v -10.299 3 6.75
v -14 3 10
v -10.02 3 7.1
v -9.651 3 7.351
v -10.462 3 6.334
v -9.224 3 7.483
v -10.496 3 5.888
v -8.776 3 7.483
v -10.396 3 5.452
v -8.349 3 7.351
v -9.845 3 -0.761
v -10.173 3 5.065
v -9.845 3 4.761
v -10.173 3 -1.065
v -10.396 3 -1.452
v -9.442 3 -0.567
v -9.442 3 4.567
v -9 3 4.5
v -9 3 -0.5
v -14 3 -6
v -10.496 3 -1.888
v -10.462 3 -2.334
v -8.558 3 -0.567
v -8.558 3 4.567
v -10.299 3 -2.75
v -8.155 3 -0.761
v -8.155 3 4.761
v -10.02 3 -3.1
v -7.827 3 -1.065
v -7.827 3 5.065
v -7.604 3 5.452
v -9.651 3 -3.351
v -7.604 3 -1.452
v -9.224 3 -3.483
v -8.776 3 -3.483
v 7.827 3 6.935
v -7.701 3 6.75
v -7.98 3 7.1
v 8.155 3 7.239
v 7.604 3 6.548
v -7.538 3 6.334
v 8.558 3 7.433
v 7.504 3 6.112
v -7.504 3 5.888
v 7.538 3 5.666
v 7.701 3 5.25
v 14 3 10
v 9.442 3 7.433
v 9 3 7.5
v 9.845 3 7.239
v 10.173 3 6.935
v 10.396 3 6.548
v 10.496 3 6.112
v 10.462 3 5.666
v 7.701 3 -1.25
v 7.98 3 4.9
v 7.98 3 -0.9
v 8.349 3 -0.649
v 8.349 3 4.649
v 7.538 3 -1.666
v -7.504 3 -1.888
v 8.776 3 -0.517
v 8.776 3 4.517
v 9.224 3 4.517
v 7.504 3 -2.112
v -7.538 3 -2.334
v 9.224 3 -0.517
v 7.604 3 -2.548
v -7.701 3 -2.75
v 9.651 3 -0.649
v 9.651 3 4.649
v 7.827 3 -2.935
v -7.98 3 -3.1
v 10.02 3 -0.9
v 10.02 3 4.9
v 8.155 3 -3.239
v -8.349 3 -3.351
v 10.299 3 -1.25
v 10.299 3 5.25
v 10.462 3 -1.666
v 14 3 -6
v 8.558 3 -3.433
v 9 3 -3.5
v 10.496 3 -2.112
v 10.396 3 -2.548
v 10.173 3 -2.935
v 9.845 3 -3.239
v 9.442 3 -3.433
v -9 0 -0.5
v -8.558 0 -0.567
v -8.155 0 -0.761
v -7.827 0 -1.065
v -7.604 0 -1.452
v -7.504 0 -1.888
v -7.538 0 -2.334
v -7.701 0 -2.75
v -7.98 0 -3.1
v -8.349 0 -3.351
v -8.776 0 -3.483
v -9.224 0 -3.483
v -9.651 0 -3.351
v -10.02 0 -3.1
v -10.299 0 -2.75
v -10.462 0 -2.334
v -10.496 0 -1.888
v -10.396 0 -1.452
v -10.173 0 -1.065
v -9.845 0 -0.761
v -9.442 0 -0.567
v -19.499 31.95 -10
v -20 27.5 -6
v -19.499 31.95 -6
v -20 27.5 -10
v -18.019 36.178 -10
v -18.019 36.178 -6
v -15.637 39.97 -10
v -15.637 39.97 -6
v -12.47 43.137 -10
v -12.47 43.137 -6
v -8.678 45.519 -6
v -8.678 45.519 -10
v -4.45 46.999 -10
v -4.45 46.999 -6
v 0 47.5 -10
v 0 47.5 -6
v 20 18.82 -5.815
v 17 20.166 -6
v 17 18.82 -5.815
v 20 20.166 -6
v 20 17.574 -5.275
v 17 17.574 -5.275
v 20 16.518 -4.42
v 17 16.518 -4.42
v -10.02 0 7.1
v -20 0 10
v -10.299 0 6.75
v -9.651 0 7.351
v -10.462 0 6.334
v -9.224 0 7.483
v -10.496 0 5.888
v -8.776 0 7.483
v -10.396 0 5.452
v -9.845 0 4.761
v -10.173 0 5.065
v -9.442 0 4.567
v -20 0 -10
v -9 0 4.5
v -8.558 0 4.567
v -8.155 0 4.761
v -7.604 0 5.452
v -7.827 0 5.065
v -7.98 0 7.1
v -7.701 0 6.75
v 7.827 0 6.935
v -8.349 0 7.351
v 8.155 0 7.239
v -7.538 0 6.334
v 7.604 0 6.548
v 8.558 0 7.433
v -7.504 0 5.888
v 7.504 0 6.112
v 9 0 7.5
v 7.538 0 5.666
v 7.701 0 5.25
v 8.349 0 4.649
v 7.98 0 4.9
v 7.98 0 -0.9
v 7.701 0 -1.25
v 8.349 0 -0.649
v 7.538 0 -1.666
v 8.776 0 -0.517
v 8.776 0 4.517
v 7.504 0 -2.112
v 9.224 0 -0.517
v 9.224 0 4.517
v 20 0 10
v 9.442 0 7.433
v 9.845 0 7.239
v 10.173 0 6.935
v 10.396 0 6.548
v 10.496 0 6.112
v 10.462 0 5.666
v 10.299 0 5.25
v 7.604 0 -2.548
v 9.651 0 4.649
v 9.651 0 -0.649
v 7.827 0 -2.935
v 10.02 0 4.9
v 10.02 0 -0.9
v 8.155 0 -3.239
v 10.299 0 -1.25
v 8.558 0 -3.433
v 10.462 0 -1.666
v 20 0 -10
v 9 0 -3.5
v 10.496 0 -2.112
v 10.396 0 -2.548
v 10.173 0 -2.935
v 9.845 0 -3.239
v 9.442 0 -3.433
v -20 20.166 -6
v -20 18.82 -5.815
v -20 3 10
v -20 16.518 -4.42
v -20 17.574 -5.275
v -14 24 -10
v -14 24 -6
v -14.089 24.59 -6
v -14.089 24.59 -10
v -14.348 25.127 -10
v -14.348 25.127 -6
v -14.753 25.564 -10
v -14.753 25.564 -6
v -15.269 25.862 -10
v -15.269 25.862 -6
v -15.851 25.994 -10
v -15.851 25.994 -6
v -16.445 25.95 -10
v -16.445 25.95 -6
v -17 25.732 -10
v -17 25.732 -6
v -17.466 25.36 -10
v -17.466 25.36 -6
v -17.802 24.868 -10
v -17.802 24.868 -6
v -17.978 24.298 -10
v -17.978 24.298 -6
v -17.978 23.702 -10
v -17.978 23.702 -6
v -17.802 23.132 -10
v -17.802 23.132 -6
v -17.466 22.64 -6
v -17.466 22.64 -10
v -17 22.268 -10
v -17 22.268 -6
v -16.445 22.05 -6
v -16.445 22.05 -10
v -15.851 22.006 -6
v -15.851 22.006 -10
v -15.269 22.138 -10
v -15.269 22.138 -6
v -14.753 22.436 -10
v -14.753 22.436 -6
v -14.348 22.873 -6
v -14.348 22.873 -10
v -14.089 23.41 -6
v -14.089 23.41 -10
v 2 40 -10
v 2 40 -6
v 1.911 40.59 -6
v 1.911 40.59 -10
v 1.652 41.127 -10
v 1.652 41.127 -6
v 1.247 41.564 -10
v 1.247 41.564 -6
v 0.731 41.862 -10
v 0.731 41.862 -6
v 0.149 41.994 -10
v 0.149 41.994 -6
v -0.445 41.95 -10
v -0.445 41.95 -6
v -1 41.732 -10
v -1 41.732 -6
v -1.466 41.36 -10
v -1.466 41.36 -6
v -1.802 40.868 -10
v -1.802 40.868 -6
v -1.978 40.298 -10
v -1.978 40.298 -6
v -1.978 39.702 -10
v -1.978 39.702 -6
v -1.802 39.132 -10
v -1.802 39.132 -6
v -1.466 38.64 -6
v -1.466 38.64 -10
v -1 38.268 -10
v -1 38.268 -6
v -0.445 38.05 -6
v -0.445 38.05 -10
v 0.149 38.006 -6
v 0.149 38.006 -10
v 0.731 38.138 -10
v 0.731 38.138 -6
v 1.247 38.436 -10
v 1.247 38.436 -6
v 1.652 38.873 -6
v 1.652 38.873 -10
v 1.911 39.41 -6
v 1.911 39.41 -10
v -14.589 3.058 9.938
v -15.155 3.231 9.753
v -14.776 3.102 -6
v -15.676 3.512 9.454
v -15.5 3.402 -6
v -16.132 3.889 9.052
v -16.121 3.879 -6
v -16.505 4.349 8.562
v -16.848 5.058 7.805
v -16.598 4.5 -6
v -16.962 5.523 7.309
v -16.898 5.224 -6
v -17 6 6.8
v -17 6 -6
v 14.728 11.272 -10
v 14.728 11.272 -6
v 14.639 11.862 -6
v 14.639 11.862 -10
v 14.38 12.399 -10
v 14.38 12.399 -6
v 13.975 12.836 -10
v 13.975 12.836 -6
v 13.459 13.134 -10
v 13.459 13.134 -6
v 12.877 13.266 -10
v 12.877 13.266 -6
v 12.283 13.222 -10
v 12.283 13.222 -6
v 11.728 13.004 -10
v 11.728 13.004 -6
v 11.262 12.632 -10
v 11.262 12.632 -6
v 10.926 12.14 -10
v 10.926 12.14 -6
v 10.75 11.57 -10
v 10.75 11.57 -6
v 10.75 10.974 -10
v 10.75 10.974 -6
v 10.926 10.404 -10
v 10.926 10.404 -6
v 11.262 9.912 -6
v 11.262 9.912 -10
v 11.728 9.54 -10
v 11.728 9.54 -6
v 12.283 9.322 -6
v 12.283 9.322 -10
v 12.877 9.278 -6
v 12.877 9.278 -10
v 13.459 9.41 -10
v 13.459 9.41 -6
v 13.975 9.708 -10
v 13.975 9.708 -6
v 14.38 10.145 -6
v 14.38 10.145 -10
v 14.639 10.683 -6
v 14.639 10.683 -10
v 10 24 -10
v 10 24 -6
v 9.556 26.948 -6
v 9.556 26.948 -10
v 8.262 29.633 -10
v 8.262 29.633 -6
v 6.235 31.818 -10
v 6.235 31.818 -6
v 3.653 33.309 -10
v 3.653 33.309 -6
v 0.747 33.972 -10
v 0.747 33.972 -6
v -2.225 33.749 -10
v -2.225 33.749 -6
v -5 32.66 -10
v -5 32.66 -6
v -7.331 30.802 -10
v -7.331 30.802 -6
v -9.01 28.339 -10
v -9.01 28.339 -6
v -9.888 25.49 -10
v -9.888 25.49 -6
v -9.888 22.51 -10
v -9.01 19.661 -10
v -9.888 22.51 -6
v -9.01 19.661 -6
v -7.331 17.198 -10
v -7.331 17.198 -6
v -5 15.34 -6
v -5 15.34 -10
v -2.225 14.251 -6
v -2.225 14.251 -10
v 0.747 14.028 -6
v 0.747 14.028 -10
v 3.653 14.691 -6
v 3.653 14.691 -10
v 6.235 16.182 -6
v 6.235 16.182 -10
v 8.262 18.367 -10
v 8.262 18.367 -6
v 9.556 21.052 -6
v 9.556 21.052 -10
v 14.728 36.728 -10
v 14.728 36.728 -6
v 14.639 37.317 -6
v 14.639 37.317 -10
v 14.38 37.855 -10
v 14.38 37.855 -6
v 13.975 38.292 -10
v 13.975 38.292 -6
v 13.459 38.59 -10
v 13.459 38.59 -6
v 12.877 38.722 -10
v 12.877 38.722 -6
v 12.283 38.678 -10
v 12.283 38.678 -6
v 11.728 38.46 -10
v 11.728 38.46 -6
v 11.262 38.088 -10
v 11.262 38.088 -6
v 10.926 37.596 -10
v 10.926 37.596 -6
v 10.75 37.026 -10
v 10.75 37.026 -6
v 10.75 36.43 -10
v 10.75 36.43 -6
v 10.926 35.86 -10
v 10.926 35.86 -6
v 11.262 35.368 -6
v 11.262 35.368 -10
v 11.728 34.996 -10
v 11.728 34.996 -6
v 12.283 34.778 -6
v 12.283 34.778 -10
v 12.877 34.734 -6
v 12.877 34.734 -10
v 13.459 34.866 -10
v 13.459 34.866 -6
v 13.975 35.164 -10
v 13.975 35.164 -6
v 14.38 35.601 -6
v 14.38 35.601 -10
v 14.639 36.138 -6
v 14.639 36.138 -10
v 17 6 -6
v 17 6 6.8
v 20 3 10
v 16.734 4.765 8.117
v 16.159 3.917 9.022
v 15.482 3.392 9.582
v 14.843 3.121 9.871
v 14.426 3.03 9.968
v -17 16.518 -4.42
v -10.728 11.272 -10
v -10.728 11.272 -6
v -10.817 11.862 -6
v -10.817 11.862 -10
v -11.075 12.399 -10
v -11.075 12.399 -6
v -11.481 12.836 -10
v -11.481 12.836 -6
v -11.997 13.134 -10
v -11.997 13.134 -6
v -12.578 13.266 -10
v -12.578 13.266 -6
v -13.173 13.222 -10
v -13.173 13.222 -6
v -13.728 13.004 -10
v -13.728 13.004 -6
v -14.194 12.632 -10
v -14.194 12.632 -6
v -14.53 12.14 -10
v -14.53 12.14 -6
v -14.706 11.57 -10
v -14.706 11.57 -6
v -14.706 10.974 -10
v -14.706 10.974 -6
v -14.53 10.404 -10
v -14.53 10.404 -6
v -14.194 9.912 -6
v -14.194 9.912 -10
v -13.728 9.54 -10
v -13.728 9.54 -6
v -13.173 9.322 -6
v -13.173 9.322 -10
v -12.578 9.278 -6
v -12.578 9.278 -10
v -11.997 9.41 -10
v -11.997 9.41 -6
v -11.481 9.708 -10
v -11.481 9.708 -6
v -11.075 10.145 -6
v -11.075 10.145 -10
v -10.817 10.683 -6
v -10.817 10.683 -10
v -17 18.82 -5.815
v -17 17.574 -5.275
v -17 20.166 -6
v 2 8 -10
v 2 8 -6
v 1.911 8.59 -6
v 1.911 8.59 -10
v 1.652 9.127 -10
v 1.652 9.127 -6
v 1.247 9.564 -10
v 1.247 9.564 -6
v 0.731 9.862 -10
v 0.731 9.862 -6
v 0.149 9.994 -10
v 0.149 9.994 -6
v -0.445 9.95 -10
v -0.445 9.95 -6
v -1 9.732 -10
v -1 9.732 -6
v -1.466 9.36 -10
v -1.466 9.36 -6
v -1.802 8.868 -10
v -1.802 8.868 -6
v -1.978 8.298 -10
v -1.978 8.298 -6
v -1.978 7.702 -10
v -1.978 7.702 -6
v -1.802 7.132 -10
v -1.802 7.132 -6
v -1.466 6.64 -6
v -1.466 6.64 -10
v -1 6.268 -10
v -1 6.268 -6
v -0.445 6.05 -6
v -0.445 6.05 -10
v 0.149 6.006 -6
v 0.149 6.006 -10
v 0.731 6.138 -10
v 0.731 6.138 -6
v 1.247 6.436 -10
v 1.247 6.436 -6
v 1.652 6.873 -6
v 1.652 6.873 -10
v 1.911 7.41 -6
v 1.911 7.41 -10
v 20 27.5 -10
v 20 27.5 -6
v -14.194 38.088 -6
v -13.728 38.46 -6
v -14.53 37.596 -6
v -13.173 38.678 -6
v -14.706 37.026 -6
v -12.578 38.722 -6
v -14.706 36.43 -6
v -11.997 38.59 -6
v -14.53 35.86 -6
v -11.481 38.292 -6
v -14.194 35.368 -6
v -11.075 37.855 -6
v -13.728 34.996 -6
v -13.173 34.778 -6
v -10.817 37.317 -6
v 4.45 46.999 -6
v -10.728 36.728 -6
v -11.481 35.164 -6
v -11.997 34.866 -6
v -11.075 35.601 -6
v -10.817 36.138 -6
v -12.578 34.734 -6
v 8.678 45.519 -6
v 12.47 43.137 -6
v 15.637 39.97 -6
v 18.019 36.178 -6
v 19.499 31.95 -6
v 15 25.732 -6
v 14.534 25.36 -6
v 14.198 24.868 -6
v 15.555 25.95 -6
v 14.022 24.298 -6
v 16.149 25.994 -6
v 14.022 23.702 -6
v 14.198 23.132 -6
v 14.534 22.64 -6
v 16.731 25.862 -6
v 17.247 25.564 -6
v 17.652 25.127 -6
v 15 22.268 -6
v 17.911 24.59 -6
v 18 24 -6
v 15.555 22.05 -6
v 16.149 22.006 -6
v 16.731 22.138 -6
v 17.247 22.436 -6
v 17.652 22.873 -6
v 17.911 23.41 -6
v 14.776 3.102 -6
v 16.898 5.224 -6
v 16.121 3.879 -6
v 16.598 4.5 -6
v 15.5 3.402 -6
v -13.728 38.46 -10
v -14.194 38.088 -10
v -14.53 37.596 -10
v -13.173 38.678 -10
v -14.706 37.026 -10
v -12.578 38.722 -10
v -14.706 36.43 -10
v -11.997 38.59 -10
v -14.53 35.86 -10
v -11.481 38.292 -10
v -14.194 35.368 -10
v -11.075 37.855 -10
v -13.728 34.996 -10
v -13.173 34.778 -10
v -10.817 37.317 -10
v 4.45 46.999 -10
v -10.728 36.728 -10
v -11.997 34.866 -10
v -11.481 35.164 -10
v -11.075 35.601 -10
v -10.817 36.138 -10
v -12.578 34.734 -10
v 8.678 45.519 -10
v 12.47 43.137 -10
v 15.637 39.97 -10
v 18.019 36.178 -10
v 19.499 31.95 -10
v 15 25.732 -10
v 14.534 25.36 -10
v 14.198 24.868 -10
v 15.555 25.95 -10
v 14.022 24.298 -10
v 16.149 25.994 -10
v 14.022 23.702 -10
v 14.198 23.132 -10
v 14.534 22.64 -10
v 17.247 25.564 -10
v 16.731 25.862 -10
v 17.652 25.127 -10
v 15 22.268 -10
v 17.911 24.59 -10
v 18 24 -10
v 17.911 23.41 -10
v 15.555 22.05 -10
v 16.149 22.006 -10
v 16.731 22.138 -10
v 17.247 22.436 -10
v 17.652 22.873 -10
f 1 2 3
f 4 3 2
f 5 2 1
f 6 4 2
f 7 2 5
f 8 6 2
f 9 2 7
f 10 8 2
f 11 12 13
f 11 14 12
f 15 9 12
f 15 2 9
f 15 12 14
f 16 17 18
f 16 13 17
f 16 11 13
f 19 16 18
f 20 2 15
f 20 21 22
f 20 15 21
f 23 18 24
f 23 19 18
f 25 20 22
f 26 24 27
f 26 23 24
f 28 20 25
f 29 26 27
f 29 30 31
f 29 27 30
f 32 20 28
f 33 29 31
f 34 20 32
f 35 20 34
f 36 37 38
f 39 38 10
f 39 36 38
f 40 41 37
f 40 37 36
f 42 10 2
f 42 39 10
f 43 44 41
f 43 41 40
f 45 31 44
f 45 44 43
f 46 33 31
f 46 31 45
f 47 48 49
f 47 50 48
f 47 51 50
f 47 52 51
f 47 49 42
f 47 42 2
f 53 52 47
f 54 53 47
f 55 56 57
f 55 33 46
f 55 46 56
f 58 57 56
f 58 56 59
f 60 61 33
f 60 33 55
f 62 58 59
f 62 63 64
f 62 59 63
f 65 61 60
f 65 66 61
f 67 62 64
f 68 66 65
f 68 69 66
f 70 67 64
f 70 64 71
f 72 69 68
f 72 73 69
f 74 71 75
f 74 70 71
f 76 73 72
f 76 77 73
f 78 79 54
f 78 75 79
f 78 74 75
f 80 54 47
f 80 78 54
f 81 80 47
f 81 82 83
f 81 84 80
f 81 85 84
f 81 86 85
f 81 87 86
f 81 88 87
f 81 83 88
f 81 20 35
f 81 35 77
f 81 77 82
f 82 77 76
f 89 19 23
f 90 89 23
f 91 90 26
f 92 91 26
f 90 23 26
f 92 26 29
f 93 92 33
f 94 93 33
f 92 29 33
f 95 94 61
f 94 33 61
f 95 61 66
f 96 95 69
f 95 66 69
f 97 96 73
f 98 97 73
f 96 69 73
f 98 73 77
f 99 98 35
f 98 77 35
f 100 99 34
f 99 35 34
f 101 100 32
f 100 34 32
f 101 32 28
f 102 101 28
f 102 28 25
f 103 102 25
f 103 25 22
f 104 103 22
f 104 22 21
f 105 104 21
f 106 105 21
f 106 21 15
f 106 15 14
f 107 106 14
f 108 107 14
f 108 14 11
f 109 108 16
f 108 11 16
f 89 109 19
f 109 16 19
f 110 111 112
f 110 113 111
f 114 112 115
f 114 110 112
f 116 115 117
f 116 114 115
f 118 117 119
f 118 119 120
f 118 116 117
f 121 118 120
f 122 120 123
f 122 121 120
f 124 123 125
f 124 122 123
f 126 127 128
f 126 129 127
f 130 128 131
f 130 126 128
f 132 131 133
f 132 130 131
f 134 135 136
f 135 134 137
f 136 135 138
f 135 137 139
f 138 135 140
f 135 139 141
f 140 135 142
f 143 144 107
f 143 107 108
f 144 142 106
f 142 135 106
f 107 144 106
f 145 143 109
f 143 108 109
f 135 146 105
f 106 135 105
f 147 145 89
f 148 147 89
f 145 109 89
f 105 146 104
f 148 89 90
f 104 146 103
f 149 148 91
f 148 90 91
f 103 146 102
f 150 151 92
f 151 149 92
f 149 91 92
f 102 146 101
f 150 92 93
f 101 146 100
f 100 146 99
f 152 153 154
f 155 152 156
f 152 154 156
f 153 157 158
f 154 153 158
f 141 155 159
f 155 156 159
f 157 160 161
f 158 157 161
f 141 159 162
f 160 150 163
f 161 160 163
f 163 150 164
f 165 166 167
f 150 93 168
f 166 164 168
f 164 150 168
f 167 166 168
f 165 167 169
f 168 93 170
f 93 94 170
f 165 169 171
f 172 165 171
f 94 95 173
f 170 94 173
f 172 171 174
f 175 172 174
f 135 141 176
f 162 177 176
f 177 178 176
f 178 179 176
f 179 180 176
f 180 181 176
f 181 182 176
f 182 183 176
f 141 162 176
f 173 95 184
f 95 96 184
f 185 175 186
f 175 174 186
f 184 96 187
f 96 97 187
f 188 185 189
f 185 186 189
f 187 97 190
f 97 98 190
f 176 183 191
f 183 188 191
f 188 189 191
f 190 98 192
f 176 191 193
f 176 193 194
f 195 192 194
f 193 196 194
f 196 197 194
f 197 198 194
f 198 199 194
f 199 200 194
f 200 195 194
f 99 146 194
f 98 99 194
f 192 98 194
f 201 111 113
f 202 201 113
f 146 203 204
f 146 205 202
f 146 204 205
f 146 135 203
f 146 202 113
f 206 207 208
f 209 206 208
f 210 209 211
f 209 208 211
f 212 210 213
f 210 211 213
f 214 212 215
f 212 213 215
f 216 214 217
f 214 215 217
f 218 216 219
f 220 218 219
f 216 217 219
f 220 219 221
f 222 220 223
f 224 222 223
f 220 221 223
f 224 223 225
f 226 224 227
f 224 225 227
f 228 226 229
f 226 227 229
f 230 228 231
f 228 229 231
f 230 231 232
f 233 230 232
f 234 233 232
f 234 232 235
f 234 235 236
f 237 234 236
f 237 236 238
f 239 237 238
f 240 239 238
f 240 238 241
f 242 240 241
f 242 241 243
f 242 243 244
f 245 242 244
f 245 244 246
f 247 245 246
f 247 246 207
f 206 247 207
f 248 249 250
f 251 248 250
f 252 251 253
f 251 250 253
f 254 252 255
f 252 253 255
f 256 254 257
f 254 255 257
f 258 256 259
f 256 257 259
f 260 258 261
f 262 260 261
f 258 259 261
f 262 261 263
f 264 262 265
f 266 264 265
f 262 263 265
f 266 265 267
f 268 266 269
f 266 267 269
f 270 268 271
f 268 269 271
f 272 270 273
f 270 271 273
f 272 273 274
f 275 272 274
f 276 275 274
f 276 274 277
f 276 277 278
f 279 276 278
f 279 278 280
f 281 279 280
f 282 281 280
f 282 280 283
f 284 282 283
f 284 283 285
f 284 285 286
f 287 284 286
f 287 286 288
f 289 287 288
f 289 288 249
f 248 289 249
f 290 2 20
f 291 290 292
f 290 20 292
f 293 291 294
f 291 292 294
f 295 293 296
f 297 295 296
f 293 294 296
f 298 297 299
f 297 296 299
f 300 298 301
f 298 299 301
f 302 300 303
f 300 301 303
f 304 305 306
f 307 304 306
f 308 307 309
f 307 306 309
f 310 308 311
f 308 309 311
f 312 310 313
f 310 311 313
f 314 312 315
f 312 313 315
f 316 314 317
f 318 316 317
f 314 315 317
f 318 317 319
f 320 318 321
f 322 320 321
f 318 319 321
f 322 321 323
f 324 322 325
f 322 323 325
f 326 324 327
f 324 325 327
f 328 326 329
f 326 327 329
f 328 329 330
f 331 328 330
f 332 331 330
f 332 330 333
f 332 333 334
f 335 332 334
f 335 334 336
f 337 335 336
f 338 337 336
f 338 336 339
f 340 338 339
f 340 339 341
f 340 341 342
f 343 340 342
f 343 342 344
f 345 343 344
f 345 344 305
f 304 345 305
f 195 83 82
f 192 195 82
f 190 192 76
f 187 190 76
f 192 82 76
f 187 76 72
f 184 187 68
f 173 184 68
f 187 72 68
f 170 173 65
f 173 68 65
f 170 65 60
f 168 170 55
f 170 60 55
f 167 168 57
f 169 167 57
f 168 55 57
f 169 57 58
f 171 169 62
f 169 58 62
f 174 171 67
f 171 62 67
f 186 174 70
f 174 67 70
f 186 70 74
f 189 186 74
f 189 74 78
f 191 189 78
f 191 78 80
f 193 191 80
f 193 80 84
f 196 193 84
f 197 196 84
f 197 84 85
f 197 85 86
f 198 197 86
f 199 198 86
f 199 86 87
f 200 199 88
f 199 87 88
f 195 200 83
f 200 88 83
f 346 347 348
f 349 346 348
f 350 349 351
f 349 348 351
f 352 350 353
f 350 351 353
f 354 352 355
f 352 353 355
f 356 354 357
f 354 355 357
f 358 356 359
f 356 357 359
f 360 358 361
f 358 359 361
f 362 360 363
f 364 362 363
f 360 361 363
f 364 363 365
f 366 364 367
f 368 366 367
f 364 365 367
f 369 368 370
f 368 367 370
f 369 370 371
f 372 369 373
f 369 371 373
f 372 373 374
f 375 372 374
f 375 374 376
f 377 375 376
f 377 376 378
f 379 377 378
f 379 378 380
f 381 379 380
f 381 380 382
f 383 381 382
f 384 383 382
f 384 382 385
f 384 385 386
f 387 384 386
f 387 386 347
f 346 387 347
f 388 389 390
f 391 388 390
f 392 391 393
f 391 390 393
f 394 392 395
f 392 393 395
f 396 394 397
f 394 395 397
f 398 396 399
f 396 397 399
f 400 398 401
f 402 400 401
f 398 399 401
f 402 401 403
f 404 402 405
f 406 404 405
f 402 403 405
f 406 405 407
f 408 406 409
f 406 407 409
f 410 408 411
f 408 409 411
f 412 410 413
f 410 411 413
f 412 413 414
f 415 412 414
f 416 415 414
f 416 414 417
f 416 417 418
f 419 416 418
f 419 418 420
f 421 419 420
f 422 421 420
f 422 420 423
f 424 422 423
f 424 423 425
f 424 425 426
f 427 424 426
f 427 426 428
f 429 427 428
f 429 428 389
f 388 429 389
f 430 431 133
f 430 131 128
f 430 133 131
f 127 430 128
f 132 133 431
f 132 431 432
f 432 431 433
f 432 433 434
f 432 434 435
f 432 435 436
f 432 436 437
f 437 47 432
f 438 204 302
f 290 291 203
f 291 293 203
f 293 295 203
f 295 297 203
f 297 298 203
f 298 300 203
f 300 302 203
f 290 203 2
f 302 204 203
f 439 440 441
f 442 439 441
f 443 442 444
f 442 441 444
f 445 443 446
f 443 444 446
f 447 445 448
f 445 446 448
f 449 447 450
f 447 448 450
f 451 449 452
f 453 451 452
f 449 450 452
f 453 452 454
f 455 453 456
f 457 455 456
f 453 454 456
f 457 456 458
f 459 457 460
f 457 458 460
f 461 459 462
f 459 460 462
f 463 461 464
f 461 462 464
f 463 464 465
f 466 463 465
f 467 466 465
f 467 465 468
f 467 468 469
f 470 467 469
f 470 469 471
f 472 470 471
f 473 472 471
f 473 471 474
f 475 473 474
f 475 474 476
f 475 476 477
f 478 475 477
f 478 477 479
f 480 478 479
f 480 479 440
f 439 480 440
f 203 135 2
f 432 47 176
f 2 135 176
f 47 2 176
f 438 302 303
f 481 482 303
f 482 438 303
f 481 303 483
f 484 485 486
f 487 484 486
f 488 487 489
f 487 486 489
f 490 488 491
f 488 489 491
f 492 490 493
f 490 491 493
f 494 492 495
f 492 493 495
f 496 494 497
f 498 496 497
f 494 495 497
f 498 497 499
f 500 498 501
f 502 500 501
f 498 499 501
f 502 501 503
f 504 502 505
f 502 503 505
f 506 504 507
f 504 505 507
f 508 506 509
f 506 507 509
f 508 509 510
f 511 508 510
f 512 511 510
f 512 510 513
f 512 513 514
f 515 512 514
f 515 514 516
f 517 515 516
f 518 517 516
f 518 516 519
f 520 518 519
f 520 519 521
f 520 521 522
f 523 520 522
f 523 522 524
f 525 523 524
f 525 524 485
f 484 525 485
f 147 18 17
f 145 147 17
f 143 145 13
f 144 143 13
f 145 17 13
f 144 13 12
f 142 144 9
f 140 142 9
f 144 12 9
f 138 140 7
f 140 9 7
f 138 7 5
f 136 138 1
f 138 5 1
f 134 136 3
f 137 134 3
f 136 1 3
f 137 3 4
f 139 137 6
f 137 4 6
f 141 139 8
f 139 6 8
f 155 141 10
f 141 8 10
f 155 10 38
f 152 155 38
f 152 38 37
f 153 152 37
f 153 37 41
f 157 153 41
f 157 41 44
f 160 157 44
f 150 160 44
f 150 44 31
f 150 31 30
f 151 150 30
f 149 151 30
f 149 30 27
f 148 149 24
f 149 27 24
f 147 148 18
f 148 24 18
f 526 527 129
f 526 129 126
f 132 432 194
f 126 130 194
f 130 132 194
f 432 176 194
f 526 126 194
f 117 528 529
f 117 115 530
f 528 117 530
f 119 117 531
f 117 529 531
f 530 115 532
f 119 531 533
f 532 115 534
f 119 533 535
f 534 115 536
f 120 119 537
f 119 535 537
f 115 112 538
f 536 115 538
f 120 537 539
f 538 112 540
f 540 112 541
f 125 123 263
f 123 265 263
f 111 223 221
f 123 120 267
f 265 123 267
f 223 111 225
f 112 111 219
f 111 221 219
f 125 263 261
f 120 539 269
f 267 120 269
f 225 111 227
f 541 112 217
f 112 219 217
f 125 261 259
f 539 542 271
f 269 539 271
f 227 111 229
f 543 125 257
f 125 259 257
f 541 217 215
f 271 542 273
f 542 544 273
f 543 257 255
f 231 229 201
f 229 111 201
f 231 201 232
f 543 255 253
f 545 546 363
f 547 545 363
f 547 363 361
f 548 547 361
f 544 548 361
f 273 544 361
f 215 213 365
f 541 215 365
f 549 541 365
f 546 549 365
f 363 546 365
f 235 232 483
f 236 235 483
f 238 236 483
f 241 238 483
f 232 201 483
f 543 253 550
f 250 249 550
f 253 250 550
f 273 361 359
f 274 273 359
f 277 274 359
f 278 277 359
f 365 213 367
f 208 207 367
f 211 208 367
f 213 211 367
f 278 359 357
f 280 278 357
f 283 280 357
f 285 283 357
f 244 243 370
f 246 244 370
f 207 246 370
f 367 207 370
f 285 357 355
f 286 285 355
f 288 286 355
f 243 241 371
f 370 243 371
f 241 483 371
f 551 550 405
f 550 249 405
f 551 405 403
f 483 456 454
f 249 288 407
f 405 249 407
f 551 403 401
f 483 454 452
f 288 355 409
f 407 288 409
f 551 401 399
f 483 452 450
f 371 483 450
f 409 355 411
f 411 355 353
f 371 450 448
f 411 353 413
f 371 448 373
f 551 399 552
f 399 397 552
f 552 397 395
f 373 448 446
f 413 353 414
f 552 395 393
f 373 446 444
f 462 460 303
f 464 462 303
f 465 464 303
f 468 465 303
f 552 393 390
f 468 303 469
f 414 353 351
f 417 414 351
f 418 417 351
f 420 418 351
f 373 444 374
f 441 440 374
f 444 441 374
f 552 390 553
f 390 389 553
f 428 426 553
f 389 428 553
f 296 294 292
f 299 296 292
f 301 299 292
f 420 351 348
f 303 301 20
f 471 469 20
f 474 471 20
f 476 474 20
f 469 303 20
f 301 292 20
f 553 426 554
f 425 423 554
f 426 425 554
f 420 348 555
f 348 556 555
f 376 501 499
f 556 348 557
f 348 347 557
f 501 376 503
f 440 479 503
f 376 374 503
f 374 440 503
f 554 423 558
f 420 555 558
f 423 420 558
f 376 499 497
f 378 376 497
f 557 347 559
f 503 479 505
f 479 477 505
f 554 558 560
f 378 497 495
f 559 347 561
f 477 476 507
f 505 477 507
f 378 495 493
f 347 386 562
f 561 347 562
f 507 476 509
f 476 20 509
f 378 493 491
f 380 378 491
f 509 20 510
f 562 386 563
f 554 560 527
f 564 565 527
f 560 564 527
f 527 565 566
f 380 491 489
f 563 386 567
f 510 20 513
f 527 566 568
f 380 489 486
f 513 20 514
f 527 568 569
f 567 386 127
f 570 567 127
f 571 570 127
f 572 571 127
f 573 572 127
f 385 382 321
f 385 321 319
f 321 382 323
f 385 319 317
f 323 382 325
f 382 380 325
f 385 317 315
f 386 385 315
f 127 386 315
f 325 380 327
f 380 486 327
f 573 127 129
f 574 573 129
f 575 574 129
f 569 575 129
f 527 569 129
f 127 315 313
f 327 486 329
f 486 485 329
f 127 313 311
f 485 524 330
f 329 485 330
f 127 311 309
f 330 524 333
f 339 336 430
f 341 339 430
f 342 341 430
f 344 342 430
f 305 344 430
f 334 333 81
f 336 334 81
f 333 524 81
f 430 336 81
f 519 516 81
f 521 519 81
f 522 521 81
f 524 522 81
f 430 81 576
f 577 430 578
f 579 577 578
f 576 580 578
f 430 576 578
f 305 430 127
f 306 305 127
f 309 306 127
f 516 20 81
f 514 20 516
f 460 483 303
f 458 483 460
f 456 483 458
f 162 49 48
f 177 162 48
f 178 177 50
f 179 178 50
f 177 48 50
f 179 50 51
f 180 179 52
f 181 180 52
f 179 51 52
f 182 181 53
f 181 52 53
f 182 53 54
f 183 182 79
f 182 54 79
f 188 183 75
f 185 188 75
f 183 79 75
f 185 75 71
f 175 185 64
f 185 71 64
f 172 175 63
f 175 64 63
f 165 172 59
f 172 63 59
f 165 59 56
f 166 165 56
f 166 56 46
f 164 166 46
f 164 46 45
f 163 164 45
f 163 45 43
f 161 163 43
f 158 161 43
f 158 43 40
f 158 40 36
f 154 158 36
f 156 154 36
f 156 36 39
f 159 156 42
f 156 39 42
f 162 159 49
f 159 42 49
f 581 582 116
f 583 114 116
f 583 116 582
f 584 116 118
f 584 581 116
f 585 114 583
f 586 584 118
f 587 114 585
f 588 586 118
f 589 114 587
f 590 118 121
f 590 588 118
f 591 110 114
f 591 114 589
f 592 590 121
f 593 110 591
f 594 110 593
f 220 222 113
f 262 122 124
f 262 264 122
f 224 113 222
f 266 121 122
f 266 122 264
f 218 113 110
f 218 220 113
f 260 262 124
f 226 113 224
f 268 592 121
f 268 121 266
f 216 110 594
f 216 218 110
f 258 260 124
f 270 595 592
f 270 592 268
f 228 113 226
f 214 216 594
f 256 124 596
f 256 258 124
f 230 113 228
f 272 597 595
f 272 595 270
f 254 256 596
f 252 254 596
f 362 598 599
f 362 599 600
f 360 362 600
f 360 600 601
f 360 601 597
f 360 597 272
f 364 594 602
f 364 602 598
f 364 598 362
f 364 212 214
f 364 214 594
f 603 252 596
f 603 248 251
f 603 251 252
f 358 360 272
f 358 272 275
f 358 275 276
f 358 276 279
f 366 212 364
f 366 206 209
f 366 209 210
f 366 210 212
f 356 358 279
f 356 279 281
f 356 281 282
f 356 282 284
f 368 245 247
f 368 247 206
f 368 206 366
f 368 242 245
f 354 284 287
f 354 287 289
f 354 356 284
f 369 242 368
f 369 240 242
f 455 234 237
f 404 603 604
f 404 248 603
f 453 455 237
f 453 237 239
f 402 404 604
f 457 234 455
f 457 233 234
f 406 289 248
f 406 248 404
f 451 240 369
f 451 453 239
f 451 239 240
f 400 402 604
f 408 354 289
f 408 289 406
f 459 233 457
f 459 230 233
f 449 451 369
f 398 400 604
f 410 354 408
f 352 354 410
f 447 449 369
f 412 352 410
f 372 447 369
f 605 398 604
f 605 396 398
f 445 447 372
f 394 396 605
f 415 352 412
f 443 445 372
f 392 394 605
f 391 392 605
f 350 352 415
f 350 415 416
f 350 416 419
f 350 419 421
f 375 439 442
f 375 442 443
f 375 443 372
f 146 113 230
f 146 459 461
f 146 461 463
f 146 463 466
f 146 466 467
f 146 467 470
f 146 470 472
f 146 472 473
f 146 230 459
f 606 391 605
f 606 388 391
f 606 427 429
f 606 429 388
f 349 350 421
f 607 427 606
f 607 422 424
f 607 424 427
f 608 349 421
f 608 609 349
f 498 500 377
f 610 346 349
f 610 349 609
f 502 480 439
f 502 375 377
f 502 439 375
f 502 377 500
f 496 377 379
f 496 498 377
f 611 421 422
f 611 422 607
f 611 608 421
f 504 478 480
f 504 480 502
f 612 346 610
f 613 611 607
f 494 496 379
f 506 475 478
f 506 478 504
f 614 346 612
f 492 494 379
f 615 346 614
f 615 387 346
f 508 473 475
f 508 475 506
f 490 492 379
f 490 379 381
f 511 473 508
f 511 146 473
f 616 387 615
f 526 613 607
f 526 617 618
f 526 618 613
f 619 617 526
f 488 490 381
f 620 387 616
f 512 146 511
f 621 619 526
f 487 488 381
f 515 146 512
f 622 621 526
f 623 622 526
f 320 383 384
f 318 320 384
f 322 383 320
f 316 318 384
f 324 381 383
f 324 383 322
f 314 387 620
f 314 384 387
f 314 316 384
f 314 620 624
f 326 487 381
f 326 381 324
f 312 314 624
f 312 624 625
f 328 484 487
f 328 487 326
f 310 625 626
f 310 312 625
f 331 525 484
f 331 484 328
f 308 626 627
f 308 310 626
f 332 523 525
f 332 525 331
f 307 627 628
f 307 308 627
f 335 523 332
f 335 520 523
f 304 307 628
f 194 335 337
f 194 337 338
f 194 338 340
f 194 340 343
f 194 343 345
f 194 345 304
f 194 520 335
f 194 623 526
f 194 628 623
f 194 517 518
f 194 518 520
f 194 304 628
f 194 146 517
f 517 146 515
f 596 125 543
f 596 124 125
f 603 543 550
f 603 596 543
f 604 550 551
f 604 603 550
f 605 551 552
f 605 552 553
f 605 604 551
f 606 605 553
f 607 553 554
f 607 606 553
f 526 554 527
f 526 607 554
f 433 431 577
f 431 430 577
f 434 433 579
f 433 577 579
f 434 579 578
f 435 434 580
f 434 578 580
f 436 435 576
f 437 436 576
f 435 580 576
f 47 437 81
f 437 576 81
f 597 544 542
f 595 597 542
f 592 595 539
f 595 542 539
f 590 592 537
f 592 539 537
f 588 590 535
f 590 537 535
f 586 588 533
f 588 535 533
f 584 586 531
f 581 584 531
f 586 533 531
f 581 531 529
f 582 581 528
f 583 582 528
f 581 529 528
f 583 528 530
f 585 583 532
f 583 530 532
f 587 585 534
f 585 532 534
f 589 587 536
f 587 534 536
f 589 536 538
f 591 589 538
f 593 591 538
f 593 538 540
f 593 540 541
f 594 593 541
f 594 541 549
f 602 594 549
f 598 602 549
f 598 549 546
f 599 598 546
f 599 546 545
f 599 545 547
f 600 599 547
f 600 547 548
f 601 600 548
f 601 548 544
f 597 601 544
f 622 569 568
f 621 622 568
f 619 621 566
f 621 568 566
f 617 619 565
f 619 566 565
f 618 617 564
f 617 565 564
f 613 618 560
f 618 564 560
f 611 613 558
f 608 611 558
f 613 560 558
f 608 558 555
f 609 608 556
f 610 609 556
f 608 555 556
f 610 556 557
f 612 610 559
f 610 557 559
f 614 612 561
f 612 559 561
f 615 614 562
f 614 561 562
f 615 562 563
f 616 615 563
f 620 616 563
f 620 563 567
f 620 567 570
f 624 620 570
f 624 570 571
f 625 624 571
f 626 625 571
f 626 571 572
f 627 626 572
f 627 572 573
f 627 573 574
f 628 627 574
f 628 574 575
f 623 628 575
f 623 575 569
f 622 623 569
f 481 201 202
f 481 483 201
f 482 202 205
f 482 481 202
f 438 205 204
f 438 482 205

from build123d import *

# Parameters (mm, degrees)
SKETCH_1_W          = 40
SKETCH_1_H          = 20
EXTRUDE_1_DEPTH     = 3
SKETCH_2_W          = 40
SKETCH_2_H          = 4
EXTRUDE_2_DEPTH     = 44.5
SKETCH_3_R          = 10
SKETCH_3_R_2        = 2
CUT_EXTRUDE_1_DEPTH = 54.965266607
FILLET_1_R          = 20
SKETCH_4_W          = 3
SKETCH_4_H          = 16
EXTRUDE_3_DEPTH     = 15
CUT_EXTRUDE_2_DEPTH = 63.898728127
FILLET_2_R          = 5
FILLET_3_R          = 3
SKETCH_6_R          = 1.5
CUT_EXTRUDE_3_DEPTH = 3
SKETCH_7_R          = 2
CUT_EXTRUDE_4_DEPTH = 54.965266607


with BuildPart() as part:
    # 草图1 → 凸台-拉伸1 (new body)
    with BuildSketch(Plane(origin=(0, 0, 0), x_dir=(1, 0, 0), z_dir=(0, 1, 0))):
        Rectangle(SKETCH_1_W, SKETCH_1_H)
    extrude(amount=EXTRUDE_1_DEPTH)

    # 草图2 → 凸台-拉伸2 (add)
    with BuildSketch(Plane(origin=(0, 3, 0), x_dir=(1, 0, 0), z_dir=(0, 1, 0))):
        with Locations((0, 8)):
            Rectangle(SKETCH_2_W, SKETCH_2_H)
    extrude(amount=EXTRUDE_2_DEPTH)

    # 草图3 → 切除-拉伸1 (cut, through all)
    with BuildSketch(Plane.XY.offset(-6)):
        with Locations((0, 24)):
            Circle(SKETCH_3_R)
        with Locations((12.727922061, 36.727922061)):
            Circle(SKETCH_3_R_2)
        with Locations((12.727922061, 11.272077939)):
            Circle(SKETCH_3_R_2)
        with Locations((-12.727922061, 11.272077939)):
            Circle(SKETCH_3_R_2)
        with Locations((-12.727922061, 36.727922061)):
            Circle(SKETCH_3_R_2)
    extrude(amount=-CUT_EXTRUDE_1_DEPTH, mode=Mode.SUBTRACT)

    # 圆角1
    fillet_1_edges = [part.edges().sort_by_distance(p)[0] for p in [
        (20, 47.5, -8),
        (-20, 47.5, -8),
    ]]
    fillet(fillet_1_edges, radius=FILLET_1_R - 0.0001)  # a hair under: the kernel refuses the full size

    # 草图4 → 凸台-拉伸3 (add)
    with BuildSketch(Plane(origin=(0, 3, 0), x_dir=(1, 0, 0), z_dir=(0, 1, 0))):
        with Locations((-18.5, -2)):
            Rectangle(SKETCH_4_W, SKETCH_4_H)
        with Locations((18.5, -2)):
            Rectangle(SKETCH_4_W, SKETCH_4_H)
    extrude(amount=EXTRUDE_3_DEPTH)

    # 草图5 → 切除-拉伸2 (cut, through all)
    with BuildSketch(Plane.ZY.offset(20)):
        Polygon((-6, 18), (10, 3), (10, 18), align=None)
    extrude(amount=-CUT_EXTRUDE_2_DEPTH, mode=Mode.SUBTRACT)

    # 圆角2
    fillet_2_edges = [part.edges().sort_by_distance(p)[0] for p in [
        (-18.5, 18, -6),
        (18.5, 18, -6),
    ]]
    fillet(fillet_2_edges, radius=FILLET_2_R)

    # 圆角3
    fillet_3_edges = [part.edges().sort_by_distance(p)[0] for p in [
        (-17, 3, 2),
        (17, 3, 2),
    ]]
    fillet(fillet_3_edges, radius=FILLET_3_R)

    # 草图6 → 切除-拉伸3 (cut)
    with BuildSketch(Plane(origin=(0, 3, 0), x_dir=(1, 0, 0), z_dir=(0, 1, 0))):
        with Locations(Location((-9, 2, 0), (0, 0, 270))):
            Circle(SKETCH_6_R)
        with Locations(Location((9, 2, 0), (0, 0, 90))):
            Circle(SKETCH_6_R)
        with Locations(Location((9, -6, 0), (0, 0, 270))):
            Circle(SKETCH_6_R)
        with Locations(Location((-9, -6, 0), (0, 0, 90))):
            Circle(SKETCH_6_R)
    extrude(amount=-CUT_EXTRUDE_3_DEPTH, mode=Mode.SUBTRACT)

    # 草图7 → 切除-拉伸4 (cut, through all)
    with BuildSketch(Plane.XY.offset(-6)):
        with Locations((0, 40)):
            Circle(SKETCH_7_R)
        with Locations((-16, 24)):
            Circle(SKETCH_7_R)
        with Locations((0, 8)):
            Circle(SKETCH_7_R)
        with Locations((16, 24)):
            Circle(SKETCH_7_R)
    extrude(amount=-CUT_EXTRUDE_4_DEPTH, mode=Mode.SUBTRACT)


solid = part.part
